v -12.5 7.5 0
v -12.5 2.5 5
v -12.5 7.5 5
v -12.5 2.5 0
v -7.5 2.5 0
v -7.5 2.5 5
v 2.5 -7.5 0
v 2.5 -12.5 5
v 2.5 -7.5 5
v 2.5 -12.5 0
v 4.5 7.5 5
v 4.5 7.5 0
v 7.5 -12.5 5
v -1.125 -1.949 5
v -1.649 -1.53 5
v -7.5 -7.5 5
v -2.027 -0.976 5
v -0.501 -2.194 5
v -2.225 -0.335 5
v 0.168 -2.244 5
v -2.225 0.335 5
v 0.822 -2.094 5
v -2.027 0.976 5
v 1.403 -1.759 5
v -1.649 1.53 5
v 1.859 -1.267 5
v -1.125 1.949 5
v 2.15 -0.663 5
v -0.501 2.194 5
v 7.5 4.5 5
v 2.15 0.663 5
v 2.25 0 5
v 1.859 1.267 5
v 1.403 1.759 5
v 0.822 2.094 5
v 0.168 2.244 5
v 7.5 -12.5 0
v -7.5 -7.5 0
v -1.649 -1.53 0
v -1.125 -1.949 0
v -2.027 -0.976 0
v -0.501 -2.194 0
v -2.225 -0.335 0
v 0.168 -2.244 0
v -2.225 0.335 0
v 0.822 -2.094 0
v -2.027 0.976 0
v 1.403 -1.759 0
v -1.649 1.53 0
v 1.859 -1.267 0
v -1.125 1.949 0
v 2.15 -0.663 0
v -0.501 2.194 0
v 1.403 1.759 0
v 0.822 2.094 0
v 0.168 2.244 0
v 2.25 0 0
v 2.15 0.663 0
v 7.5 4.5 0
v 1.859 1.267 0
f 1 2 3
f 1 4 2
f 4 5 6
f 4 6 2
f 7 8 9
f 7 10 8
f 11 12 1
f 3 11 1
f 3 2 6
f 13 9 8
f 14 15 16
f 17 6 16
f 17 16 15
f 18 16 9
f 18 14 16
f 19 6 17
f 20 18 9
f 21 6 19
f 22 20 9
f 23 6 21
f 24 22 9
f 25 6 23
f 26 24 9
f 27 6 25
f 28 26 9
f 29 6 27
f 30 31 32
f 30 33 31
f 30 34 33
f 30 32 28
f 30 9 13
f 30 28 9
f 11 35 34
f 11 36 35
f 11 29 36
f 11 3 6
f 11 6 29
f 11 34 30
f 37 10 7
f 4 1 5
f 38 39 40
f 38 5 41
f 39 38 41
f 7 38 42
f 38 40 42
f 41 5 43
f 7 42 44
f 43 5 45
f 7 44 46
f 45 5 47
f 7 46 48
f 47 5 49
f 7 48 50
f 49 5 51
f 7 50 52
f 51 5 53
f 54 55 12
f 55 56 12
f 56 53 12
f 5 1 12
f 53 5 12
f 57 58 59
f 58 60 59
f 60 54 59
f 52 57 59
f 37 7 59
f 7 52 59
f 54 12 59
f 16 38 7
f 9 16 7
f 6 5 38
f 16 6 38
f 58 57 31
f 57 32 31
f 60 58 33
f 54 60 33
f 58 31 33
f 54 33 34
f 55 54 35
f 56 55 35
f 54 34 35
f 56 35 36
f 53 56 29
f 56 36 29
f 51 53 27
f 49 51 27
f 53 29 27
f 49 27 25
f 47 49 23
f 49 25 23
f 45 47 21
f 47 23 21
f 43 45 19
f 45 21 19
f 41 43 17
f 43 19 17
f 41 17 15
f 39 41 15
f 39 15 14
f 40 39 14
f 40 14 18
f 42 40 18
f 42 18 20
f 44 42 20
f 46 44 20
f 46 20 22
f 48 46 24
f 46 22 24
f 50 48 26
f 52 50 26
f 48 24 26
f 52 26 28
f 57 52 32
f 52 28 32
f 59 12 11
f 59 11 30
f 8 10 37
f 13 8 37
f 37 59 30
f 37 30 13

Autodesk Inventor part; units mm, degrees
sketch "Sketch1" plane through (0, 0, 0) normal (0, 0, 1) x (1, 0, 0)
  line L0 (-5.7775, 0) -> (5.7775, 0) construction
  line L1 (4.5, 7.5) -> (-12.5, 7.5)
  line L2 (-12.5, 7.5) -> (4.5, 7.5)
  line L3 (4.5, 7.5) -> (7.5, 4.5)
  line L4 (4.5, 7.5) -> (7.5, 4.5)
  line L5 (7.5, 4.5) -> (7.5, -12.5)
  line L6 (7.5, 4.5) -> (7.5, -12.5)
  line L7 (2.5, -12.5) -> (7.5, -12.5)
  line L8 (7.5, -12.5) -> (2.5, -12.5)
  line L9 (-7.5, -7.5) -> (2.5, -7.5)
  line L10 (2.5, -12.5) -> (2.5, -7.5)
  line L11 (2.5, -7.5) -> (-7.5, -7.5)
  line L12 (-7.5, 2.5) -> (-7.5, -7.5)
  line L13 (-7.5, -7.5) -> (-7.5, 2.5)
  line L14 (-7.5, 2.5) -> (-12.5, 2.5)
  line L15 (-7.5, 2.5) -> (-12.5, 2.5)
  line L16 (-12.5, 2.5) -> (-12.5, 7.5)
extrude "Extrusion1" add sketch "Sketch1" along normal blind 5
sketch "Sketch2" plane through (0, 0, 5) normal (0, 0, 1) x (1, 0, 0)
  circle A0 centre (0, 0) radius 2.25
  dimension "d2" = 4.5
extrude "Extrusion2" cut sketch "Sketch2" against normal blind 5
properties part number "bevestiging deksel zonder moer" material "S235"
